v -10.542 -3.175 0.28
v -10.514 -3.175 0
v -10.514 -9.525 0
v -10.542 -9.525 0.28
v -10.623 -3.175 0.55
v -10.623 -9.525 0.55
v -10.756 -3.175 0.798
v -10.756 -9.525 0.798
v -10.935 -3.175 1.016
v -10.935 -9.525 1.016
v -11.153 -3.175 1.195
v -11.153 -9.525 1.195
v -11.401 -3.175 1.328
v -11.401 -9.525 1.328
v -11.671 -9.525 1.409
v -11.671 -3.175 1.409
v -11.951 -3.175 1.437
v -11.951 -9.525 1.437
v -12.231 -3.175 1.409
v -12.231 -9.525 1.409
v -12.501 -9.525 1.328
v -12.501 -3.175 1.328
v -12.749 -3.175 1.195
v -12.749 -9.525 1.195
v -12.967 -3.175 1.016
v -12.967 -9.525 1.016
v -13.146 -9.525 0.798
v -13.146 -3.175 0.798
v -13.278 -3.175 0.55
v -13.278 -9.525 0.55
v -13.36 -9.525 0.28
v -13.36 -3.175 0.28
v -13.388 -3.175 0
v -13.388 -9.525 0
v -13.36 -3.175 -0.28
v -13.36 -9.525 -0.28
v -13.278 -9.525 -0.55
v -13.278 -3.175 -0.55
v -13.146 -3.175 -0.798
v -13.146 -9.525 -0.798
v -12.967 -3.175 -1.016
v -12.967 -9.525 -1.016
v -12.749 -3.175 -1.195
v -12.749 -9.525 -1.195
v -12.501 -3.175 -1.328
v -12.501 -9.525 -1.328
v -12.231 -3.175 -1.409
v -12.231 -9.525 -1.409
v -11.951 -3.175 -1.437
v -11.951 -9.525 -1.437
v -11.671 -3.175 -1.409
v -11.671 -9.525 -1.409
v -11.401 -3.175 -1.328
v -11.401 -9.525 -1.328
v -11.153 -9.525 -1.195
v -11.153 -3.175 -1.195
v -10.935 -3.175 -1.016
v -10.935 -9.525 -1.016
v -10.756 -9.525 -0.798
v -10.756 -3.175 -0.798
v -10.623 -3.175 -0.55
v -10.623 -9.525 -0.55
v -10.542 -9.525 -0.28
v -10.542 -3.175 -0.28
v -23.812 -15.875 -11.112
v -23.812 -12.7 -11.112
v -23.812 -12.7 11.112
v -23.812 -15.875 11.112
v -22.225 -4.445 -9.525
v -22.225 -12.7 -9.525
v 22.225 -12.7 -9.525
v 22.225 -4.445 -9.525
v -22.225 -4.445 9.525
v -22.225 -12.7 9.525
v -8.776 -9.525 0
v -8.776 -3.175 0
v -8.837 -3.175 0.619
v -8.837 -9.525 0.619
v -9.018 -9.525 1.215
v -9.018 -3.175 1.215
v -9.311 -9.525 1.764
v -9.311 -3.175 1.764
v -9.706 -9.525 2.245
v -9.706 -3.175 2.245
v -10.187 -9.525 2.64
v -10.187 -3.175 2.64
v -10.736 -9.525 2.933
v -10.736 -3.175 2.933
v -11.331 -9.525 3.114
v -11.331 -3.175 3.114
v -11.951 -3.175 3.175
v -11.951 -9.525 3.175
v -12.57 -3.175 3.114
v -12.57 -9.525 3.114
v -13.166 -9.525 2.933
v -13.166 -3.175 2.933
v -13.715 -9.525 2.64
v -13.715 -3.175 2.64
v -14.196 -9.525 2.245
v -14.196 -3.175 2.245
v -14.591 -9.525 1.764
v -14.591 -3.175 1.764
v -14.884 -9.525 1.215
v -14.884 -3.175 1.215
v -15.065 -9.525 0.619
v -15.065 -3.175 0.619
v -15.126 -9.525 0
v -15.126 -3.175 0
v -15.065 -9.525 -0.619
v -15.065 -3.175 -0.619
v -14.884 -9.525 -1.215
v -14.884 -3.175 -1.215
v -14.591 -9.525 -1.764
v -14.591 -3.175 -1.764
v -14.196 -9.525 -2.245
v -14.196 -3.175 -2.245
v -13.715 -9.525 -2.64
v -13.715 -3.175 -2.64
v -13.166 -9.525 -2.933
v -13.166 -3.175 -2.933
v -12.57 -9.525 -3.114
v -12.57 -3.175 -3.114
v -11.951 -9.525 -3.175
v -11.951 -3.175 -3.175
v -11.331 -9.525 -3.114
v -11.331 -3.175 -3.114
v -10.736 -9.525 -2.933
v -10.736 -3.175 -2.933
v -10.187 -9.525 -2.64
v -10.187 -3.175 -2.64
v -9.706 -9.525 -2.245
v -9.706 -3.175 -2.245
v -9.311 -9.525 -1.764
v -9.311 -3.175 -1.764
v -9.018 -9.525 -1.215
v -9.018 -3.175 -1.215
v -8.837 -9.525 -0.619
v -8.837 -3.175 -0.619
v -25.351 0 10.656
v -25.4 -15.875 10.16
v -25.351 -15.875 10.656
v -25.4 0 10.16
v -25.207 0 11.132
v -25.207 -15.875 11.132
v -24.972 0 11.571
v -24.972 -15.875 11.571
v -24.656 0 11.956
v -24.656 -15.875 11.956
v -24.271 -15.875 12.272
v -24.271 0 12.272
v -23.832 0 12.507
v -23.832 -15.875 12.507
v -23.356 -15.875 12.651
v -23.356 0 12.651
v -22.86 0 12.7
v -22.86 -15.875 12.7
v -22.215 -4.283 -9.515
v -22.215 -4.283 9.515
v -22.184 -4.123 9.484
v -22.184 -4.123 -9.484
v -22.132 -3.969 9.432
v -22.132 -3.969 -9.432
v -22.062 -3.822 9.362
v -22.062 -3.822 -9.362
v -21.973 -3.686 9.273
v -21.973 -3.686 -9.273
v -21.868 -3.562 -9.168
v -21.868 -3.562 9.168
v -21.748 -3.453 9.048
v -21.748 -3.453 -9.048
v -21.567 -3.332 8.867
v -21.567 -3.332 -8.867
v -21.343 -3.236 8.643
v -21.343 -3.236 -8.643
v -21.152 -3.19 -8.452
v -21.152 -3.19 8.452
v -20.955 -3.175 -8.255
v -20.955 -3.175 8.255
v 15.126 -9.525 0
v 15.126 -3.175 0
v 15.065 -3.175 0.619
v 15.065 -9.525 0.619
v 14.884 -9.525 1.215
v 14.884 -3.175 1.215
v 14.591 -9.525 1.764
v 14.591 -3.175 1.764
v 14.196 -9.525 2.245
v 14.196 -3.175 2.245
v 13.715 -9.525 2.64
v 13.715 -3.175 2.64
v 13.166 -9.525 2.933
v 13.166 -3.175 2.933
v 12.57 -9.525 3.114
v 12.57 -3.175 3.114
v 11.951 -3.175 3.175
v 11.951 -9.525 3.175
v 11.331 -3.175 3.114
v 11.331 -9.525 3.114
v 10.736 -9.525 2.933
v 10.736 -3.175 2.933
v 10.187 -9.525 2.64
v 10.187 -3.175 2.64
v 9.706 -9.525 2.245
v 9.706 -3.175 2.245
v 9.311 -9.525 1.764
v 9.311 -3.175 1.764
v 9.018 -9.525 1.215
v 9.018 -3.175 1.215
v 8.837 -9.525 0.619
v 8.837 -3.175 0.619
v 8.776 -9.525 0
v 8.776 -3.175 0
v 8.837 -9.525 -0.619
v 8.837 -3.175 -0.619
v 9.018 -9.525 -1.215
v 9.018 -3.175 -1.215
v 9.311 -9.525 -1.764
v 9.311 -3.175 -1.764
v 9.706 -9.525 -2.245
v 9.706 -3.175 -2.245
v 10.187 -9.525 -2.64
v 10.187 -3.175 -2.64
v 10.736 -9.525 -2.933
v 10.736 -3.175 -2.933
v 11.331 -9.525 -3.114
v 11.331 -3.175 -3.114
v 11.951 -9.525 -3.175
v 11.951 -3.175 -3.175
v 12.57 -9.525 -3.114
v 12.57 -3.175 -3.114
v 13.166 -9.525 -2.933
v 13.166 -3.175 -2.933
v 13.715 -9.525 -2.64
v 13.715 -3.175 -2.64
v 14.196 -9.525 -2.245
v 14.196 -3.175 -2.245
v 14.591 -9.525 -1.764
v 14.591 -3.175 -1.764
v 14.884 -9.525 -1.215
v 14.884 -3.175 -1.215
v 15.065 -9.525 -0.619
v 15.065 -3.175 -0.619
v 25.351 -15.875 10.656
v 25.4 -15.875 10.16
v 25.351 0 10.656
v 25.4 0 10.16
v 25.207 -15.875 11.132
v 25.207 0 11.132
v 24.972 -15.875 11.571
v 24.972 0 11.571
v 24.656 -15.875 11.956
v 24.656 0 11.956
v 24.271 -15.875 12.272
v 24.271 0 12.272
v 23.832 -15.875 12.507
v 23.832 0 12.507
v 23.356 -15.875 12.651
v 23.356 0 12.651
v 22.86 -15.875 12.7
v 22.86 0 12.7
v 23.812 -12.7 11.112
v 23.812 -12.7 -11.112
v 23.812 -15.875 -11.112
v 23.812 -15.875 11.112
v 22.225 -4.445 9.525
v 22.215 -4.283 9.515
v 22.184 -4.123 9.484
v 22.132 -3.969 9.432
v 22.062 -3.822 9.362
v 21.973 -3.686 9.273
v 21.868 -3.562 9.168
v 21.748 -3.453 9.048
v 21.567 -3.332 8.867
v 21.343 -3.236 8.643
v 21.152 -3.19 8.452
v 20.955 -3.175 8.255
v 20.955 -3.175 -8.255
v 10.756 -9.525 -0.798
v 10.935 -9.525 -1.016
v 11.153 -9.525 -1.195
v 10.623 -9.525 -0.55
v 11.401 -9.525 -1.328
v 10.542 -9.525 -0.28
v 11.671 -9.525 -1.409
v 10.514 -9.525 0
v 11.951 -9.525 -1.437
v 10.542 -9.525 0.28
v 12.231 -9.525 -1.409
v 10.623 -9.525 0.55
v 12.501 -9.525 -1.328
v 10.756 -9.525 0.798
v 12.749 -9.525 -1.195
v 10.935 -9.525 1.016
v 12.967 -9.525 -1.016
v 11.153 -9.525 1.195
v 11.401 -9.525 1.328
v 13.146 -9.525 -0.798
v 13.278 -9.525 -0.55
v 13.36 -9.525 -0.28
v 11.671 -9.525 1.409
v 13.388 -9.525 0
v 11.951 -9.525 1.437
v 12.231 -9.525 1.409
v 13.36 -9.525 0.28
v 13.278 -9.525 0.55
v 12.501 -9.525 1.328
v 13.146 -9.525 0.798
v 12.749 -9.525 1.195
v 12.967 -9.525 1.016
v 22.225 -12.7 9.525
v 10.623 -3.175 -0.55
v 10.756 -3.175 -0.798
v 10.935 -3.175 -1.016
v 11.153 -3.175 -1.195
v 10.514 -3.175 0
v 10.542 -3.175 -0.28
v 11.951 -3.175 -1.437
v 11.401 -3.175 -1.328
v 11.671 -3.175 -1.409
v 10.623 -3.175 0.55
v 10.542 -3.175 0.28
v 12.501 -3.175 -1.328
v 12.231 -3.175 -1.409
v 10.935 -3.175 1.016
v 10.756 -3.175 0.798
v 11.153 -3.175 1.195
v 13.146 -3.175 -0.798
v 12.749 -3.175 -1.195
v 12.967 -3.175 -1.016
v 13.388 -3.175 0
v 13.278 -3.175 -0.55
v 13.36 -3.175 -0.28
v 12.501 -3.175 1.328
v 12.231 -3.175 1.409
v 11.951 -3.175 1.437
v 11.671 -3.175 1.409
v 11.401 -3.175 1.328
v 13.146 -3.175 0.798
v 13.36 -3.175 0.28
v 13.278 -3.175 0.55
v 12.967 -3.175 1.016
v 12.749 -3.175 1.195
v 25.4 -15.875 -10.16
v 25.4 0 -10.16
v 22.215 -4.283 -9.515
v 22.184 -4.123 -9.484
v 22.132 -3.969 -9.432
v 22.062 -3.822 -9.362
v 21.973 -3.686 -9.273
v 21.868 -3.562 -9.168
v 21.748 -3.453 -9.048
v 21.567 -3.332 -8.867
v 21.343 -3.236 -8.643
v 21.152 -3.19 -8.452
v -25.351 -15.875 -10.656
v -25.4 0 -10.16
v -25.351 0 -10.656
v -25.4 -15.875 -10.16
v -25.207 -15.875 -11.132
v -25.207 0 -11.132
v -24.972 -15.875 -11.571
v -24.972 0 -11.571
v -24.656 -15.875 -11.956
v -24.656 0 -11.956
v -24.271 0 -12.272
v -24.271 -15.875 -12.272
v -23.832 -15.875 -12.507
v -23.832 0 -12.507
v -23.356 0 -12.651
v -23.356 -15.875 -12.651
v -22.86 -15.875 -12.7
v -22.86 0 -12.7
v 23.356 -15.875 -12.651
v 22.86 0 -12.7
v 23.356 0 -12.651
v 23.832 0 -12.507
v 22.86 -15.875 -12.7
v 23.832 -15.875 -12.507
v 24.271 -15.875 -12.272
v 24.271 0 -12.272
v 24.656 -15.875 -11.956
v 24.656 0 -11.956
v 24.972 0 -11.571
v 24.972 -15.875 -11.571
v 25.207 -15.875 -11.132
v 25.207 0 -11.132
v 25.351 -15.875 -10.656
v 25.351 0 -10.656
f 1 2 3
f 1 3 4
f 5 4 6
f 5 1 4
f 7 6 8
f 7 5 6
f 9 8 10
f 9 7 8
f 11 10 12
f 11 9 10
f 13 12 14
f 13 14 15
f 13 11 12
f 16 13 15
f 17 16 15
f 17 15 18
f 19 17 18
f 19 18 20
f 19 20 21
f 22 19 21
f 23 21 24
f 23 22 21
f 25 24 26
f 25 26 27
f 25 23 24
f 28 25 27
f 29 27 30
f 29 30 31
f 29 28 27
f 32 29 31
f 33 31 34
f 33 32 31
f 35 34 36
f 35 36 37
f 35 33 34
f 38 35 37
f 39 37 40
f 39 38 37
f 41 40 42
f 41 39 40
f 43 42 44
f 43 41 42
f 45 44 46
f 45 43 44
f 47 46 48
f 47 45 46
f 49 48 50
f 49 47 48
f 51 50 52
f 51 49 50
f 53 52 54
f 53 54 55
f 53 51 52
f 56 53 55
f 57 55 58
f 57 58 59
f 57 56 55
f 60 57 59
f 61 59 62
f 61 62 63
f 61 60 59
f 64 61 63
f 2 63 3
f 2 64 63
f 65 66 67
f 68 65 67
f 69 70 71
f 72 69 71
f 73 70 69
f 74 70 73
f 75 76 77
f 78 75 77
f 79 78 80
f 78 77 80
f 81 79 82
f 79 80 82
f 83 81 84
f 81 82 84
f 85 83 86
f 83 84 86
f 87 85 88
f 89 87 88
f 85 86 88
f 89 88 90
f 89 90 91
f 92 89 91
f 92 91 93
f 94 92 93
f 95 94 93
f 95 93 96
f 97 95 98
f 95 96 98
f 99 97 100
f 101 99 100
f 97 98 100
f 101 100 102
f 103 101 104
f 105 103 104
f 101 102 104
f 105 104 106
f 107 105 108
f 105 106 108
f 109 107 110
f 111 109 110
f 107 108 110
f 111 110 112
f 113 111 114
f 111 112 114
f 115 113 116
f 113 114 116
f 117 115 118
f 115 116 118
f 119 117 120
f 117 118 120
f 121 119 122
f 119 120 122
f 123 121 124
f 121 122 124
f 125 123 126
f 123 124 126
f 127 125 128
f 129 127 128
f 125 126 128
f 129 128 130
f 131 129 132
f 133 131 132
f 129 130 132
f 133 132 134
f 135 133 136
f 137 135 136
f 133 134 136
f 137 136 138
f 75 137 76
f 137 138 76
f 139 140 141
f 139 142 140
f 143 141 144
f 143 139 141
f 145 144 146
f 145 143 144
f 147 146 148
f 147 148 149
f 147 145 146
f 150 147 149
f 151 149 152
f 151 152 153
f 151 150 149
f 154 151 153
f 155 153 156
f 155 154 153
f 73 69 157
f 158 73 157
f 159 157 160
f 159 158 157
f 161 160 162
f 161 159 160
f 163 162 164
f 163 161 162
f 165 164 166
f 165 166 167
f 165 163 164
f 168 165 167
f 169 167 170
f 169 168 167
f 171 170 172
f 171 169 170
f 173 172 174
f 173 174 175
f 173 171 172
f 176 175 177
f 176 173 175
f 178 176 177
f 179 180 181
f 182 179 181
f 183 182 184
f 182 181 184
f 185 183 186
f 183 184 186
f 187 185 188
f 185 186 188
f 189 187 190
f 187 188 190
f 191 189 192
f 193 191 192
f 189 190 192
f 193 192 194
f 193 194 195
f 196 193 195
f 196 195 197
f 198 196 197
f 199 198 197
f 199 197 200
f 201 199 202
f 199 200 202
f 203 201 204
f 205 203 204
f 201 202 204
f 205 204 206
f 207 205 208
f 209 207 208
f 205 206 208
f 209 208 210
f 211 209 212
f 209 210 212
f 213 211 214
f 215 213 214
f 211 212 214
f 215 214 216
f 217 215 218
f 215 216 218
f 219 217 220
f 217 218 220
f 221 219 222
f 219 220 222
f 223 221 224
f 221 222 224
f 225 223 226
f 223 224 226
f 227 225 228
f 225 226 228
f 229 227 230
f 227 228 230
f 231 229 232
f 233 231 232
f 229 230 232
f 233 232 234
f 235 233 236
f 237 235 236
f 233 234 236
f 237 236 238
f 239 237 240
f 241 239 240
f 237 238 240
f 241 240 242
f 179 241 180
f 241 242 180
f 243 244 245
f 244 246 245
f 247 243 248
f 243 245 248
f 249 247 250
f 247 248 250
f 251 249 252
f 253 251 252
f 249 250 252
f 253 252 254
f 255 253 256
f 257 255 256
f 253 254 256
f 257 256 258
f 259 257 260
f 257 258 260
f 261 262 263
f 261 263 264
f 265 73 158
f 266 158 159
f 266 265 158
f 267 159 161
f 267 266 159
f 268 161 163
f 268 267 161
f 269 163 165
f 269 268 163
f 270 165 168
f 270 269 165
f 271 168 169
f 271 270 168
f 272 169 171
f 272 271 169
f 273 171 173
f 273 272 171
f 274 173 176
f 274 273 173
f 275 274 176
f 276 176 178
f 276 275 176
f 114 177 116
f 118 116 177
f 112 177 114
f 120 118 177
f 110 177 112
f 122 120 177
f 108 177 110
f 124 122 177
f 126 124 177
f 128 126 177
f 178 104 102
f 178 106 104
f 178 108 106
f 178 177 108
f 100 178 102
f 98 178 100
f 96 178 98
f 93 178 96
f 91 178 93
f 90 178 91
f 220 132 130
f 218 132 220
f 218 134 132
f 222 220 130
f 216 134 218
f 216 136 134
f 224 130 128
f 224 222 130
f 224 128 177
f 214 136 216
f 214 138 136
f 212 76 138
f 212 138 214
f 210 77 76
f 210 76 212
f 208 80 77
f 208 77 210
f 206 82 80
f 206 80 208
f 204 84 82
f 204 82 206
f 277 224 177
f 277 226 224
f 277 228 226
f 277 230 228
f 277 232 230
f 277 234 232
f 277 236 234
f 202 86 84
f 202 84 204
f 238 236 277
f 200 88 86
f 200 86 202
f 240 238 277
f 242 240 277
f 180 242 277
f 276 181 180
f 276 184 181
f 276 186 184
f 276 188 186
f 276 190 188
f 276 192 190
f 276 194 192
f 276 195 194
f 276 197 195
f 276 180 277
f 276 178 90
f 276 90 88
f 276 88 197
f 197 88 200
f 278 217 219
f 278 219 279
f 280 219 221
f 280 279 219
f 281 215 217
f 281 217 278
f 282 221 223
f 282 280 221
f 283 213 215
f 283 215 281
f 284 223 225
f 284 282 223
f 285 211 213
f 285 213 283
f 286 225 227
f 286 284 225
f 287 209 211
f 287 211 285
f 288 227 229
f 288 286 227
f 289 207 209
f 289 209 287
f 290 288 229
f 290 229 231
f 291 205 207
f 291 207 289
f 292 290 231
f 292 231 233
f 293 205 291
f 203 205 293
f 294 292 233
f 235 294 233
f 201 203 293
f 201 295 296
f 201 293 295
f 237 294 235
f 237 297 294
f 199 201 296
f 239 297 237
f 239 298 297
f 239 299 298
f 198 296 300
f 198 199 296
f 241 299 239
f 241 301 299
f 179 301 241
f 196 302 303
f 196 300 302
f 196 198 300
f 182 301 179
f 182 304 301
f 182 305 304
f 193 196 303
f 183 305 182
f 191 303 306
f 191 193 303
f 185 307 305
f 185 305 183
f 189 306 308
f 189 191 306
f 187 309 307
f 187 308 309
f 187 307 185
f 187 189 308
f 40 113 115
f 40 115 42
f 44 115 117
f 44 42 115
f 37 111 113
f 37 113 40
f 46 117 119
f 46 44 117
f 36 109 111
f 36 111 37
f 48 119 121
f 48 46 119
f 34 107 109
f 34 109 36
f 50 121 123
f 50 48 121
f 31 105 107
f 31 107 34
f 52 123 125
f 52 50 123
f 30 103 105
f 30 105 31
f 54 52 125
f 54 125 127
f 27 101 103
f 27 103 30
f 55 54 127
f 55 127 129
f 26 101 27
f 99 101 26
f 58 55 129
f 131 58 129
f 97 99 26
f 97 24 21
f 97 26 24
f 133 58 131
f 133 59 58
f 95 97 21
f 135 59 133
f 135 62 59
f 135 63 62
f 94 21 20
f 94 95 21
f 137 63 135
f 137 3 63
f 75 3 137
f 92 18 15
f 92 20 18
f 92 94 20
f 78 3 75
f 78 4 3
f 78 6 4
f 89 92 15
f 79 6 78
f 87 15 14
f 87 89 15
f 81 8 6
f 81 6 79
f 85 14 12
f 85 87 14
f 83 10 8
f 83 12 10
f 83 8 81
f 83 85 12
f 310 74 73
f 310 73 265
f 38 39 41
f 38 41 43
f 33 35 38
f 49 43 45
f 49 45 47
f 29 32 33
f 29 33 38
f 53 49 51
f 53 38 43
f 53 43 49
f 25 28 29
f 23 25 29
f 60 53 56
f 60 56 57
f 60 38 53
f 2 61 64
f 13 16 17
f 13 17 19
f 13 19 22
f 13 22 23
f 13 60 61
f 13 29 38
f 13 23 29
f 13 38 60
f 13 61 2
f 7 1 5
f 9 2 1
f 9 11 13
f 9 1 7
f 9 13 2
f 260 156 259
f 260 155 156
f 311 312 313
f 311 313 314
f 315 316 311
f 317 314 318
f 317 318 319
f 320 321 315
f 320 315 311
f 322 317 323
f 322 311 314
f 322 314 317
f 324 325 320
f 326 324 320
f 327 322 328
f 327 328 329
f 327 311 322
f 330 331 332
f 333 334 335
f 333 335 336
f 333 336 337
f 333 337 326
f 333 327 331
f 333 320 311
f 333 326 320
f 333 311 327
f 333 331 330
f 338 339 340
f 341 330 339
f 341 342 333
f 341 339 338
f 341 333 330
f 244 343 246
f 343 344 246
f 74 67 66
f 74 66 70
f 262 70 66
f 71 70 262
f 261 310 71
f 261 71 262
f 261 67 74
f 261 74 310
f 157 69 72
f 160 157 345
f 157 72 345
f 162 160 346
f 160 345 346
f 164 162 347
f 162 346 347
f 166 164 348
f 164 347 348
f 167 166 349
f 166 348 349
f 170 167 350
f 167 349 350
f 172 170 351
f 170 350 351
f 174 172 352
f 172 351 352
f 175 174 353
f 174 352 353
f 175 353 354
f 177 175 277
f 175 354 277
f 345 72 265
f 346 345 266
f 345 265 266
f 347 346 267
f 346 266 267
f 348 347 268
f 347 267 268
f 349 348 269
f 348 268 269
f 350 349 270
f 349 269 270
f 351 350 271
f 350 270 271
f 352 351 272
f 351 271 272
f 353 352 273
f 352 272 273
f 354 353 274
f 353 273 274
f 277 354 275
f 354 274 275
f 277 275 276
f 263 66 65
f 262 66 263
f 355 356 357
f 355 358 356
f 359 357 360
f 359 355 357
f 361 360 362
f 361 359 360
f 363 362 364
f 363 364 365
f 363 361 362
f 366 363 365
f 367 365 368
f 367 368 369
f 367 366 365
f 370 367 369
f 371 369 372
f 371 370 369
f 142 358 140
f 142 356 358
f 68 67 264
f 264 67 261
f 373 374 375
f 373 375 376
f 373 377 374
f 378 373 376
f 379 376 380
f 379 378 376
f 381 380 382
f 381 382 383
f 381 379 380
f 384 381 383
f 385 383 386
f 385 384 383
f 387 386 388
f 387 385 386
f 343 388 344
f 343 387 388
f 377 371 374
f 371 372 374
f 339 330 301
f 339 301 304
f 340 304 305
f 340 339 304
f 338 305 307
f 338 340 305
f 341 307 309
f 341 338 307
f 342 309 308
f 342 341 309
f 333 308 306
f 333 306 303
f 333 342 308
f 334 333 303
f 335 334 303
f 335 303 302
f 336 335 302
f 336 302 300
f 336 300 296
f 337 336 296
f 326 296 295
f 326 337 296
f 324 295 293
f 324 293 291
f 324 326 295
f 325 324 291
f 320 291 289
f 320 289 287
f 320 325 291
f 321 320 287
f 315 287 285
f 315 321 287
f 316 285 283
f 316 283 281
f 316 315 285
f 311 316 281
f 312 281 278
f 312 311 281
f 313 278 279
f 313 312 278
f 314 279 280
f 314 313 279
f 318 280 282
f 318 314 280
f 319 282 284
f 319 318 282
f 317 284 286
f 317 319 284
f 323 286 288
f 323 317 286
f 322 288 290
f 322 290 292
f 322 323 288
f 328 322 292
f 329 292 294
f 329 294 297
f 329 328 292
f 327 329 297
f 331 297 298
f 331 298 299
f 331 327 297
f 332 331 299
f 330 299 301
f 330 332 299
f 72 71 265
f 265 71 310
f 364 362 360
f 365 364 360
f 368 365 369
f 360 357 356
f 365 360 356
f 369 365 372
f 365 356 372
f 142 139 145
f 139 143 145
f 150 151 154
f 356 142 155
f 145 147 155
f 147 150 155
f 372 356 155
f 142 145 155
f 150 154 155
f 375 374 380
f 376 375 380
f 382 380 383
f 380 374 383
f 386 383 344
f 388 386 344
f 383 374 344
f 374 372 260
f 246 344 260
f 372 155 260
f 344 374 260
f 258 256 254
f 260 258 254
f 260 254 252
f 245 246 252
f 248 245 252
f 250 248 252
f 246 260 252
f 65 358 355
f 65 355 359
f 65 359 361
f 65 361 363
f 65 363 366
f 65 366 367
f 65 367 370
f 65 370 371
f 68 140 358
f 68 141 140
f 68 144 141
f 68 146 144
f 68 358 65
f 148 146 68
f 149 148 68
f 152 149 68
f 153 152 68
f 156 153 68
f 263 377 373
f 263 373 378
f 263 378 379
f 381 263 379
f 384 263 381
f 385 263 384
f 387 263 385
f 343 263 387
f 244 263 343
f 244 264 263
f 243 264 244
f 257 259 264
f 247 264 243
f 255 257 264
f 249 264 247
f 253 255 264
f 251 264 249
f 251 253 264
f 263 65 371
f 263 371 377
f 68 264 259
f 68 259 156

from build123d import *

# Parameters (mm, degrees)
F0_W     = 50.8
F0_H     = 25.4
F0_W_2   = 44.45
F0_H_2   = 19.05
F1_DEPTH = 12.7
F2_W     = 44.45
F2_H     = 19.05
F3_DEPTH = 9.525
F4_R     = 1.27
F5_W     = 50.8
F5_H     = 25.4
F5_W_2   = 47.625
F5_H_2   = 22.225
F6_DEPTH = 3.175
F7_R     = 2.54
F8_R     = 3.175
F8_R_2   = 1.43697608
F9_DEPTH = 6.35


with BuildPart() as f1:
    # F0 (on Front) → F1 (new body)
    with BuildSketch(Plane.XZ):
        Rectangle(F0_W, F0_H)
        Rectangle(F0_W_2, F0_H_2, mode=Mode.SUBTRACT)
        Rectangle(F0_W_2, F0_H_2)
    extrude(amount=F1_DEPTH)

    # F2 (on face) → F3 (cut)
    with BuildSketch(Plane.XZ.offset(12.7)):
        Rectangle(F2_W, F2_H)
    extrude(amount=-F3_DEPTH, mode=Mode.SUBTRACT)

    # F4
    f4_edges = [f1.edges().sort_by_distance(p)[0] for p in [
        (22.225, -3.175, 0),
        (0, -3.175, 9.525),
        (-22.225, -3.175, 0),
        (0, -3.175, -9.525),
    ]]
    fillet(f4_edges, radius=F4_R)

    # F5 (on face) → F6 (join)
    with BuildSketch(Plane.XZ.offset(12.7)):
        Rectangle(F5_W, F5_H)
        Rectangle(F5_W_2, F5_H_2, mode=Mode.SUBTRACT)
    extrude(amount=F6_DEPTH)

    # F7
    f7_edges = [f1.edges().sort_by_distance(p)[0] for p in [
        (25.4, -7.9375, 12.7),
        (25.4, -7.9375, -12.7),
        (-25.4, -7.9375, -12.7),
        (-25.4, -7.9375, 12.7),
    ]]
    fillet(f7_edges, radius=F7_R)

    # F8 (on face) → F9 (join)
    with BuildSketch(Plane.XZ.offset(3.175)):
        with Locations((11.9508895849, 0)):
            Circle(F8_R)
        with Locations((11.9508895849, 0)):
            Circle(F8_R_2, mode=Mode.SUBTRACT)
        with Locations((-11.9508895849, 0)):
            Circle(F8_R)
        with Locations((-11.9508895849, 0)):
            Circle(F8_R_2, mode=Mode.SUBTRACT)
    extrude(amount=F9_DEPTH)


solid = f1.part
